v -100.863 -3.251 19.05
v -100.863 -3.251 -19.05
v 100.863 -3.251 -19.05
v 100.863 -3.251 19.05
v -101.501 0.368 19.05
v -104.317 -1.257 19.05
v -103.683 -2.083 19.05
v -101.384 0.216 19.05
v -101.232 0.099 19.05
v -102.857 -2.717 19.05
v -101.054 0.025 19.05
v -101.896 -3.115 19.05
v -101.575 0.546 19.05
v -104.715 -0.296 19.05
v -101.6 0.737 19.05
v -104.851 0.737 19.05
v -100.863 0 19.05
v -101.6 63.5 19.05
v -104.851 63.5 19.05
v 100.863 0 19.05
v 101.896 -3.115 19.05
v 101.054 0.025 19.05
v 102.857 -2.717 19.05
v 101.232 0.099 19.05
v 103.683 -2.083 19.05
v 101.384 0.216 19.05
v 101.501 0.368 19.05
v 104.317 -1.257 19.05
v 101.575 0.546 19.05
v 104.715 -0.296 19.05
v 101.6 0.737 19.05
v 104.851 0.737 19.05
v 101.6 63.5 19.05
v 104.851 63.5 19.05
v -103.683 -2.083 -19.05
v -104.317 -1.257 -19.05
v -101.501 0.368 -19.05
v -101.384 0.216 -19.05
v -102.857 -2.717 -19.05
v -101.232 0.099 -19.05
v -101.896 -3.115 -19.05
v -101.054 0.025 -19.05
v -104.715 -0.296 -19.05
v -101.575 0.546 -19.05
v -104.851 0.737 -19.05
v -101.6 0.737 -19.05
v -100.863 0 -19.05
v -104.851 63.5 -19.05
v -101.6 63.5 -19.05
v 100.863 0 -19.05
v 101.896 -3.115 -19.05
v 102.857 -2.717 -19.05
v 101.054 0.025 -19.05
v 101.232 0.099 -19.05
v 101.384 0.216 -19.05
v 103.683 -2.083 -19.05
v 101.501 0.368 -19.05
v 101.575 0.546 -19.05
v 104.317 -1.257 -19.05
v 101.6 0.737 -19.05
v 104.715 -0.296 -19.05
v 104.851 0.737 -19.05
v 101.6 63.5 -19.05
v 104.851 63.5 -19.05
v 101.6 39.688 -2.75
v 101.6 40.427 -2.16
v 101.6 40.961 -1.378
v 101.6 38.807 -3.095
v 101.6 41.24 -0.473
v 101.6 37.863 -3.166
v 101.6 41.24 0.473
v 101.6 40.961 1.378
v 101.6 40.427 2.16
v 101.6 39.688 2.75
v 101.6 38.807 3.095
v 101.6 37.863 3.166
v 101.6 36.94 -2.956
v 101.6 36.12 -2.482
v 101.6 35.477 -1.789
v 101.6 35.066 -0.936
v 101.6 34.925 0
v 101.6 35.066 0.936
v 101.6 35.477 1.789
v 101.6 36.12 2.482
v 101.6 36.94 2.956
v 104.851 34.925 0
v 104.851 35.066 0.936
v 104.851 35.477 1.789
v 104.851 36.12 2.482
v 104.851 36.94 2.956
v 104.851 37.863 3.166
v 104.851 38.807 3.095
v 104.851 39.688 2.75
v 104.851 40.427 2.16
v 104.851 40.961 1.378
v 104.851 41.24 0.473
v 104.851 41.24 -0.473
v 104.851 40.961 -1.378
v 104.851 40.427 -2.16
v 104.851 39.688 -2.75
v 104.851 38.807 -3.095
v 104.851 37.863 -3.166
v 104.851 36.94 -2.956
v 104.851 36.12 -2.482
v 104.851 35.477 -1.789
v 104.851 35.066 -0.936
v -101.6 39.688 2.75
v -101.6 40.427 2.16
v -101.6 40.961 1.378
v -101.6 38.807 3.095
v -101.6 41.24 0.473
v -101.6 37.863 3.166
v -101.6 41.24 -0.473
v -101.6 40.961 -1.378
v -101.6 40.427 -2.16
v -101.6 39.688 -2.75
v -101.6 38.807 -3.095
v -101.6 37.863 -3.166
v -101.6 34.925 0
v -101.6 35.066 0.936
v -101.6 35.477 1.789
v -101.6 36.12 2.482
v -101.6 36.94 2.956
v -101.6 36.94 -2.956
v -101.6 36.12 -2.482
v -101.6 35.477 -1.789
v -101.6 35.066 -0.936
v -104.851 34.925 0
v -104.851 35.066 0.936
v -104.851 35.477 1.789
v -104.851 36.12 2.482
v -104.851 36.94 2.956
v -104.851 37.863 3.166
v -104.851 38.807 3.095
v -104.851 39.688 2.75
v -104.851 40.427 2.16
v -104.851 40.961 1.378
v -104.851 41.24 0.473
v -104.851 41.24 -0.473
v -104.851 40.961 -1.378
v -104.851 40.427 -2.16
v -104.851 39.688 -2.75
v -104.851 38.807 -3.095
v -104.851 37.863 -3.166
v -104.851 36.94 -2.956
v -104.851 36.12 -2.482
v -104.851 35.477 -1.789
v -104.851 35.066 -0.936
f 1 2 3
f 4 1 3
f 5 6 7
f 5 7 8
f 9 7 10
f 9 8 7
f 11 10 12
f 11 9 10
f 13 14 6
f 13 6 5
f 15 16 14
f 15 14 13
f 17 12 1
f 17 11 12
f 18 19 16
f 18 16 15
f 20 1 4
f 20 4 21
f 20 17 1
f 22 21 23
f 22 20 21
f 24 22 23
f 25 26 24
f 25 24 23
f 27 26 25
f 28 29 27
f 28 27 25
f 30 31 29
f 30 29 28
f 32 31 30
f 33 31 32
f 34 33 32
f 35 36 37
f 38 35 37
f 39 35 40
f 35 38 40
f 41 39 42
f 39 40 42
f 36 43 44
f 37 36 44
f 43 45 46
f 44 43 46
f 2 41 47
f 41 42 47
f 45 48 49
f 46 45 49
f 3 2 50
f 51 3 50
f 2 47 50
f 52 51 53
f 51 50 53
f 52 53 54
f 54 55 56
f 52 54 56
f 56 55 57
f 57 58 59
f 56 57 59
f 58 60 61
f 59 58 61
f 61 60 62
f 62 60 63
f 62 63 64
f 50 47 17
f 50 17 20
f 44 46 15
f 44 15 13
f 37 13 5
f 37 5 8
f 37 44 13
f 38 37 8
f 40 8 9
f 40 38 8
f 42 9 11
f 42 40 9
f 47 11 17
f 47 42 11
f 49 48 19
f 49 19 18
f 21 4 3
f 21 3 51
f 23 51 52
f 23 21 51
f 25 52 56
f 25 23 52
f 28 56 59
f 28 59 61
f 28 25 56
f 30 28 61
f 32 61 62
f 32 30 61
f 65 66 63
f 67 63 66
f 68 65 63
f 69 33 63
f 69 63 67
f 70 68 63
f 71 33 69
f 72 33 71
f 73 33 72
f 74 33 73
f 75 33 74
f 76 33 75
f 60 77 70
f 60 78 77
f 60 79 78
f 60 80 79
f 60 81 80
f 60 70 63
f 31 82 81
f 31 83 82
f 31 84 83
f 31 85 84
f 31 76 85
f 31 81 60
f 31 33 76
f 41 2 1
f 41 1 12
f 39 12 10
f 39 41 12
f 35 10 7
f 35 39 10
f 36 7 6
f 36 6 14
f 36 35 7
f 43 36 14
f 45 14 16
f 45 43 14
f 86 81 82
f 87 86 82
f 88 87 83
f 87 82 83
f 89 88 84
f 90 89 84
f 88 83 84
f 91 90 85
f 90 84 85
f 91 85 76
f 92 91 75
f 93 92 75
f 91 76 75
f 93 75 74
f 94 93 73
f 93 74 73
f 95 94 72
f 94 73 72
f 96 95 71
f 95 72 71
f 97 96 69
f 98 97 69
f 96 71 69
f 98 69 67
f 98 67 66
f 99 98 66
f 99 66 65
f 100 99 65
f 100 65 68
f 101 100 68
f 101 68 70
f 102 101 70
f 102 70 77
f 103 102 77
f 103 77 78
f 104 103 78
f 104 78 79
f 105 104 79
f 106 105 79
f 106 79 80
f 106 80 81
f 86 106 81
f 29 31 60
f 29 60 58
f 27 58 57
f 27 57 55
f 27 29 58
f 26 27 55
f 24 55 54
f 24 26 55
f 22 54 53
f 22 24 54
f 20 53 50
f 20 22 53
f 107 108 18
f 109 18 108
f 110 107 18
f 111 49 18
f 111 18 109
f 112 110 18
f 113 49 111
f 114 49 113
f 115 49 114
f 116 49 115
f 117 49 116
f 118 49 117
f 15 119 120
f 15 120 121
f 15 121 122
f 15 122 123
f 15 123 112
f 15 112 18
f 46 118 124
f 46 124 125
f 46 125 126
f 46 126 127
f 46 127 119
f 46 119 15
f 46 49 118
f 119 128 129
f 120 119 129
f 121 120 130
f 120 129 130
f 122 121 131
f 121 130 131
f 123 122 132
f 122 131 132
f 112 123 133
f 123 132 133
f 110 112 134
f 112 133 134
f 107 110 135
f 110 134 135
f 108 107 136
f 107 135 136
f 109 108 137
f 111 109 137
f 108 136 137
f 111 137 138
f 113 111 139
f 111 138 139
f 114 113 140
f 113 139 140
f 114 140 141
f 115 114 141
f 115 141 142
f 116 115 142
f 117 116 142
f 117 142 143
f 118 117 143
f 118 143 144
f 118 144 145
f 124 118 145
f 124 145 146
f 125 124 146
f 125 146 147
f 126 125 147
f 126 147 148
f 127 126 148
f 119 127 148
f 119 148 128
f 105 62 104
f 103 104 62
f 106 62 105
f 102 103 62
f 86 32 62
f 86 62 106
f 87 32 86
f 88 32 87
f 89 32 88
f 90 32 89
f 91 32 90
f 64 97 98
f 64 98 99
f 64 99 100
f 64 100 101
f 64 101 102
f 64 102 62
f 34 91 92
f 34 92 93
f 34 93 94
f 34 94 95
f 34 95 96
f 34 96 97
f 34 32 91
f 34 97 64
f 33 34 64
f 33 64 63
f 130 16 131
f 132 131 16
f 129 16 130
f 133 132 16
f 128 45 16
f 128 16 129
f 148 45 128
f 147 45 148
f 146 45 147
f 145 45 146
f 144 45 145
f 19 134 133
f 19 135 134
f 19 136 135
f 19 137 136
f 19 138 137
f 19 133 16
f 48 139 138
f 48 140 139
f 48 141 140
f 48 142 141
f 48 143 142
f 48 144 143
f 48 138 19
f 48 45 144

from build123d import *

# Parameters (mm, degrees)
SKETCH1_W                      = 203.2
SKETCH1_H                      = 38.1
BASE_FLANGE1_DEPTH             = 3.2512
EDGE_FLANGE1_STRIP_W           = 14.478
EDGE_FLANGE1_STRIP_H           = 3.2512
EDGE_FLANGE1_STRIP_CUT_DEPTH   = 38.1
EDGE_FLANGE1_STRIP_2_W         = 14.478
EDGE_FLANGE1_STRIP_2_H         = 3.2512
EDGE_FLANGE1_STRIP_CUT_2_DEPTH = 38.1
EDGE_FLANGE1_DEPTH             = 38.1
EDGE_FLANGE1_BEND_DEPTH        = 38.1
SKETCH10_R                     = 3.175
CUT_EXTRUDE1_DEPTH             = 220.932373847


# Sheet-metal steps are written as plain solids
with BuildPart() as part:
    # Sketch1 → Base-Flange1 (new body)
    with BuildSketch(Plane(origin=(0, 0, 0), x_dir=(1, 0, 0), z_dir=(0, 1, 0))):
        Rectangle(SKETCH1_W, SKETCH1_H)
    extrude(amount=-BASE_FLANGE1_DEPTH)

    # Edge-Flange1 strip (across the edge) → Edge-Flange1 strip cut (cut)
    with BuildSketch(Plane(origin=(-101.6, 0, -19.05), x_dir=(1, 0, 0), z_dir=(0, 0, 1))):
        with Locations((-6.5024, -1.6256)):
            Rectangle(EDGE_FLANGE1_STRIP_W, EDGE_FLANGE1_STRIP_H)
    extrude(amount=EDGE_FLANGE1_STRIP_CUT_DEPTH, mode=Mode.SUBTRACT)

    # Edge-Flange1 strip 2 (across the edge) → Edge-Flange1 strip cut 2 (cut)
    with BuildSketch(Plane(origin=(101.6, 0, 19.05), x_dir=(-1, 0, 0), z_dir=(0, 0, -1))):
        with Locations((-6.5024, -1.6256)):
            Rectangle(EDGE_FLANGE1_STRIP_2_W, EDGE_FLANGE1_STRIP_2_H)
    extrude(amount=EDGE_FLANGE1_STRIP_CUT_2_DEPTH, mode=Mode.SUBTRACT)

    # Edge-Flange1 section (across the edge) → Edge-Flange1 (add)
    with BuildSketch(Plane(origin=(-101.6, 0, -19.05), x_dir=(1, 0, 0), z_dir=(0, 0, 1))):
        with BuildLine():
            Line((-3.2512, 0.7366), (-3.2512, 63.5))
            Line((-3.2512, 63.5), (0, 63.5))
            Line((0, 63.5), (0, 0.7366))
            ThreePointArc((0, 0.7366), (0.215745145, 0.215745145), (0.7366, 0))
            Line((0.7366, 0), (0.7366, -3.2512))
            ThreePointArc((0.7366, -3.2512), (-2.083200422, -2.083200422), (-3.2512, 0.7366))
        make_face()
    extrude(amount=EDGE_FLANGE1_DEPTH)

    # Edge-Flange1 section 2 (across the edge) → Edge-Flange1 bend (add)
    with BuildSketch(Plane(origin=(101.6, 0, 19.05), x_dir=(-1, 0, 0), z_dir=(0, 0, -1))):
        with BuildLine():
            Line((-3.2512, 0.7366), (-3.2512, 63.5))
            Line((-3.2512, 63.5), (0, 63.5))
            Line((0, 63.5), (0, 0.7366))
            ThreePointArc((0, 0.7366), (0.215745145, 0.215745145), (0.7366, 0))
            Line((0.7366, 0), (0.7366, -3.2512))
            ThreePointArc((0.7366, -3.2512), (-2.083200422, -2.083200422), (-3.2512, 0.7366))
        make_face()
    extrude(amount=EDGE_FLANGE1_BEND_DEPTH)

    # Sketch10 → Cut-Extrude1 (cut, through all)
    with BuildSketch(Plane.ZY.offset(104.8512)):
        with Locations(Location((0, 38.1, 0), (0, 0, 270))):
            Circle(SKETCH10_R)
    extrude(amount=-CUT_EXTRUDE1_DEPTH, mode=Mode.SUBTRACT)


solid = part.part
